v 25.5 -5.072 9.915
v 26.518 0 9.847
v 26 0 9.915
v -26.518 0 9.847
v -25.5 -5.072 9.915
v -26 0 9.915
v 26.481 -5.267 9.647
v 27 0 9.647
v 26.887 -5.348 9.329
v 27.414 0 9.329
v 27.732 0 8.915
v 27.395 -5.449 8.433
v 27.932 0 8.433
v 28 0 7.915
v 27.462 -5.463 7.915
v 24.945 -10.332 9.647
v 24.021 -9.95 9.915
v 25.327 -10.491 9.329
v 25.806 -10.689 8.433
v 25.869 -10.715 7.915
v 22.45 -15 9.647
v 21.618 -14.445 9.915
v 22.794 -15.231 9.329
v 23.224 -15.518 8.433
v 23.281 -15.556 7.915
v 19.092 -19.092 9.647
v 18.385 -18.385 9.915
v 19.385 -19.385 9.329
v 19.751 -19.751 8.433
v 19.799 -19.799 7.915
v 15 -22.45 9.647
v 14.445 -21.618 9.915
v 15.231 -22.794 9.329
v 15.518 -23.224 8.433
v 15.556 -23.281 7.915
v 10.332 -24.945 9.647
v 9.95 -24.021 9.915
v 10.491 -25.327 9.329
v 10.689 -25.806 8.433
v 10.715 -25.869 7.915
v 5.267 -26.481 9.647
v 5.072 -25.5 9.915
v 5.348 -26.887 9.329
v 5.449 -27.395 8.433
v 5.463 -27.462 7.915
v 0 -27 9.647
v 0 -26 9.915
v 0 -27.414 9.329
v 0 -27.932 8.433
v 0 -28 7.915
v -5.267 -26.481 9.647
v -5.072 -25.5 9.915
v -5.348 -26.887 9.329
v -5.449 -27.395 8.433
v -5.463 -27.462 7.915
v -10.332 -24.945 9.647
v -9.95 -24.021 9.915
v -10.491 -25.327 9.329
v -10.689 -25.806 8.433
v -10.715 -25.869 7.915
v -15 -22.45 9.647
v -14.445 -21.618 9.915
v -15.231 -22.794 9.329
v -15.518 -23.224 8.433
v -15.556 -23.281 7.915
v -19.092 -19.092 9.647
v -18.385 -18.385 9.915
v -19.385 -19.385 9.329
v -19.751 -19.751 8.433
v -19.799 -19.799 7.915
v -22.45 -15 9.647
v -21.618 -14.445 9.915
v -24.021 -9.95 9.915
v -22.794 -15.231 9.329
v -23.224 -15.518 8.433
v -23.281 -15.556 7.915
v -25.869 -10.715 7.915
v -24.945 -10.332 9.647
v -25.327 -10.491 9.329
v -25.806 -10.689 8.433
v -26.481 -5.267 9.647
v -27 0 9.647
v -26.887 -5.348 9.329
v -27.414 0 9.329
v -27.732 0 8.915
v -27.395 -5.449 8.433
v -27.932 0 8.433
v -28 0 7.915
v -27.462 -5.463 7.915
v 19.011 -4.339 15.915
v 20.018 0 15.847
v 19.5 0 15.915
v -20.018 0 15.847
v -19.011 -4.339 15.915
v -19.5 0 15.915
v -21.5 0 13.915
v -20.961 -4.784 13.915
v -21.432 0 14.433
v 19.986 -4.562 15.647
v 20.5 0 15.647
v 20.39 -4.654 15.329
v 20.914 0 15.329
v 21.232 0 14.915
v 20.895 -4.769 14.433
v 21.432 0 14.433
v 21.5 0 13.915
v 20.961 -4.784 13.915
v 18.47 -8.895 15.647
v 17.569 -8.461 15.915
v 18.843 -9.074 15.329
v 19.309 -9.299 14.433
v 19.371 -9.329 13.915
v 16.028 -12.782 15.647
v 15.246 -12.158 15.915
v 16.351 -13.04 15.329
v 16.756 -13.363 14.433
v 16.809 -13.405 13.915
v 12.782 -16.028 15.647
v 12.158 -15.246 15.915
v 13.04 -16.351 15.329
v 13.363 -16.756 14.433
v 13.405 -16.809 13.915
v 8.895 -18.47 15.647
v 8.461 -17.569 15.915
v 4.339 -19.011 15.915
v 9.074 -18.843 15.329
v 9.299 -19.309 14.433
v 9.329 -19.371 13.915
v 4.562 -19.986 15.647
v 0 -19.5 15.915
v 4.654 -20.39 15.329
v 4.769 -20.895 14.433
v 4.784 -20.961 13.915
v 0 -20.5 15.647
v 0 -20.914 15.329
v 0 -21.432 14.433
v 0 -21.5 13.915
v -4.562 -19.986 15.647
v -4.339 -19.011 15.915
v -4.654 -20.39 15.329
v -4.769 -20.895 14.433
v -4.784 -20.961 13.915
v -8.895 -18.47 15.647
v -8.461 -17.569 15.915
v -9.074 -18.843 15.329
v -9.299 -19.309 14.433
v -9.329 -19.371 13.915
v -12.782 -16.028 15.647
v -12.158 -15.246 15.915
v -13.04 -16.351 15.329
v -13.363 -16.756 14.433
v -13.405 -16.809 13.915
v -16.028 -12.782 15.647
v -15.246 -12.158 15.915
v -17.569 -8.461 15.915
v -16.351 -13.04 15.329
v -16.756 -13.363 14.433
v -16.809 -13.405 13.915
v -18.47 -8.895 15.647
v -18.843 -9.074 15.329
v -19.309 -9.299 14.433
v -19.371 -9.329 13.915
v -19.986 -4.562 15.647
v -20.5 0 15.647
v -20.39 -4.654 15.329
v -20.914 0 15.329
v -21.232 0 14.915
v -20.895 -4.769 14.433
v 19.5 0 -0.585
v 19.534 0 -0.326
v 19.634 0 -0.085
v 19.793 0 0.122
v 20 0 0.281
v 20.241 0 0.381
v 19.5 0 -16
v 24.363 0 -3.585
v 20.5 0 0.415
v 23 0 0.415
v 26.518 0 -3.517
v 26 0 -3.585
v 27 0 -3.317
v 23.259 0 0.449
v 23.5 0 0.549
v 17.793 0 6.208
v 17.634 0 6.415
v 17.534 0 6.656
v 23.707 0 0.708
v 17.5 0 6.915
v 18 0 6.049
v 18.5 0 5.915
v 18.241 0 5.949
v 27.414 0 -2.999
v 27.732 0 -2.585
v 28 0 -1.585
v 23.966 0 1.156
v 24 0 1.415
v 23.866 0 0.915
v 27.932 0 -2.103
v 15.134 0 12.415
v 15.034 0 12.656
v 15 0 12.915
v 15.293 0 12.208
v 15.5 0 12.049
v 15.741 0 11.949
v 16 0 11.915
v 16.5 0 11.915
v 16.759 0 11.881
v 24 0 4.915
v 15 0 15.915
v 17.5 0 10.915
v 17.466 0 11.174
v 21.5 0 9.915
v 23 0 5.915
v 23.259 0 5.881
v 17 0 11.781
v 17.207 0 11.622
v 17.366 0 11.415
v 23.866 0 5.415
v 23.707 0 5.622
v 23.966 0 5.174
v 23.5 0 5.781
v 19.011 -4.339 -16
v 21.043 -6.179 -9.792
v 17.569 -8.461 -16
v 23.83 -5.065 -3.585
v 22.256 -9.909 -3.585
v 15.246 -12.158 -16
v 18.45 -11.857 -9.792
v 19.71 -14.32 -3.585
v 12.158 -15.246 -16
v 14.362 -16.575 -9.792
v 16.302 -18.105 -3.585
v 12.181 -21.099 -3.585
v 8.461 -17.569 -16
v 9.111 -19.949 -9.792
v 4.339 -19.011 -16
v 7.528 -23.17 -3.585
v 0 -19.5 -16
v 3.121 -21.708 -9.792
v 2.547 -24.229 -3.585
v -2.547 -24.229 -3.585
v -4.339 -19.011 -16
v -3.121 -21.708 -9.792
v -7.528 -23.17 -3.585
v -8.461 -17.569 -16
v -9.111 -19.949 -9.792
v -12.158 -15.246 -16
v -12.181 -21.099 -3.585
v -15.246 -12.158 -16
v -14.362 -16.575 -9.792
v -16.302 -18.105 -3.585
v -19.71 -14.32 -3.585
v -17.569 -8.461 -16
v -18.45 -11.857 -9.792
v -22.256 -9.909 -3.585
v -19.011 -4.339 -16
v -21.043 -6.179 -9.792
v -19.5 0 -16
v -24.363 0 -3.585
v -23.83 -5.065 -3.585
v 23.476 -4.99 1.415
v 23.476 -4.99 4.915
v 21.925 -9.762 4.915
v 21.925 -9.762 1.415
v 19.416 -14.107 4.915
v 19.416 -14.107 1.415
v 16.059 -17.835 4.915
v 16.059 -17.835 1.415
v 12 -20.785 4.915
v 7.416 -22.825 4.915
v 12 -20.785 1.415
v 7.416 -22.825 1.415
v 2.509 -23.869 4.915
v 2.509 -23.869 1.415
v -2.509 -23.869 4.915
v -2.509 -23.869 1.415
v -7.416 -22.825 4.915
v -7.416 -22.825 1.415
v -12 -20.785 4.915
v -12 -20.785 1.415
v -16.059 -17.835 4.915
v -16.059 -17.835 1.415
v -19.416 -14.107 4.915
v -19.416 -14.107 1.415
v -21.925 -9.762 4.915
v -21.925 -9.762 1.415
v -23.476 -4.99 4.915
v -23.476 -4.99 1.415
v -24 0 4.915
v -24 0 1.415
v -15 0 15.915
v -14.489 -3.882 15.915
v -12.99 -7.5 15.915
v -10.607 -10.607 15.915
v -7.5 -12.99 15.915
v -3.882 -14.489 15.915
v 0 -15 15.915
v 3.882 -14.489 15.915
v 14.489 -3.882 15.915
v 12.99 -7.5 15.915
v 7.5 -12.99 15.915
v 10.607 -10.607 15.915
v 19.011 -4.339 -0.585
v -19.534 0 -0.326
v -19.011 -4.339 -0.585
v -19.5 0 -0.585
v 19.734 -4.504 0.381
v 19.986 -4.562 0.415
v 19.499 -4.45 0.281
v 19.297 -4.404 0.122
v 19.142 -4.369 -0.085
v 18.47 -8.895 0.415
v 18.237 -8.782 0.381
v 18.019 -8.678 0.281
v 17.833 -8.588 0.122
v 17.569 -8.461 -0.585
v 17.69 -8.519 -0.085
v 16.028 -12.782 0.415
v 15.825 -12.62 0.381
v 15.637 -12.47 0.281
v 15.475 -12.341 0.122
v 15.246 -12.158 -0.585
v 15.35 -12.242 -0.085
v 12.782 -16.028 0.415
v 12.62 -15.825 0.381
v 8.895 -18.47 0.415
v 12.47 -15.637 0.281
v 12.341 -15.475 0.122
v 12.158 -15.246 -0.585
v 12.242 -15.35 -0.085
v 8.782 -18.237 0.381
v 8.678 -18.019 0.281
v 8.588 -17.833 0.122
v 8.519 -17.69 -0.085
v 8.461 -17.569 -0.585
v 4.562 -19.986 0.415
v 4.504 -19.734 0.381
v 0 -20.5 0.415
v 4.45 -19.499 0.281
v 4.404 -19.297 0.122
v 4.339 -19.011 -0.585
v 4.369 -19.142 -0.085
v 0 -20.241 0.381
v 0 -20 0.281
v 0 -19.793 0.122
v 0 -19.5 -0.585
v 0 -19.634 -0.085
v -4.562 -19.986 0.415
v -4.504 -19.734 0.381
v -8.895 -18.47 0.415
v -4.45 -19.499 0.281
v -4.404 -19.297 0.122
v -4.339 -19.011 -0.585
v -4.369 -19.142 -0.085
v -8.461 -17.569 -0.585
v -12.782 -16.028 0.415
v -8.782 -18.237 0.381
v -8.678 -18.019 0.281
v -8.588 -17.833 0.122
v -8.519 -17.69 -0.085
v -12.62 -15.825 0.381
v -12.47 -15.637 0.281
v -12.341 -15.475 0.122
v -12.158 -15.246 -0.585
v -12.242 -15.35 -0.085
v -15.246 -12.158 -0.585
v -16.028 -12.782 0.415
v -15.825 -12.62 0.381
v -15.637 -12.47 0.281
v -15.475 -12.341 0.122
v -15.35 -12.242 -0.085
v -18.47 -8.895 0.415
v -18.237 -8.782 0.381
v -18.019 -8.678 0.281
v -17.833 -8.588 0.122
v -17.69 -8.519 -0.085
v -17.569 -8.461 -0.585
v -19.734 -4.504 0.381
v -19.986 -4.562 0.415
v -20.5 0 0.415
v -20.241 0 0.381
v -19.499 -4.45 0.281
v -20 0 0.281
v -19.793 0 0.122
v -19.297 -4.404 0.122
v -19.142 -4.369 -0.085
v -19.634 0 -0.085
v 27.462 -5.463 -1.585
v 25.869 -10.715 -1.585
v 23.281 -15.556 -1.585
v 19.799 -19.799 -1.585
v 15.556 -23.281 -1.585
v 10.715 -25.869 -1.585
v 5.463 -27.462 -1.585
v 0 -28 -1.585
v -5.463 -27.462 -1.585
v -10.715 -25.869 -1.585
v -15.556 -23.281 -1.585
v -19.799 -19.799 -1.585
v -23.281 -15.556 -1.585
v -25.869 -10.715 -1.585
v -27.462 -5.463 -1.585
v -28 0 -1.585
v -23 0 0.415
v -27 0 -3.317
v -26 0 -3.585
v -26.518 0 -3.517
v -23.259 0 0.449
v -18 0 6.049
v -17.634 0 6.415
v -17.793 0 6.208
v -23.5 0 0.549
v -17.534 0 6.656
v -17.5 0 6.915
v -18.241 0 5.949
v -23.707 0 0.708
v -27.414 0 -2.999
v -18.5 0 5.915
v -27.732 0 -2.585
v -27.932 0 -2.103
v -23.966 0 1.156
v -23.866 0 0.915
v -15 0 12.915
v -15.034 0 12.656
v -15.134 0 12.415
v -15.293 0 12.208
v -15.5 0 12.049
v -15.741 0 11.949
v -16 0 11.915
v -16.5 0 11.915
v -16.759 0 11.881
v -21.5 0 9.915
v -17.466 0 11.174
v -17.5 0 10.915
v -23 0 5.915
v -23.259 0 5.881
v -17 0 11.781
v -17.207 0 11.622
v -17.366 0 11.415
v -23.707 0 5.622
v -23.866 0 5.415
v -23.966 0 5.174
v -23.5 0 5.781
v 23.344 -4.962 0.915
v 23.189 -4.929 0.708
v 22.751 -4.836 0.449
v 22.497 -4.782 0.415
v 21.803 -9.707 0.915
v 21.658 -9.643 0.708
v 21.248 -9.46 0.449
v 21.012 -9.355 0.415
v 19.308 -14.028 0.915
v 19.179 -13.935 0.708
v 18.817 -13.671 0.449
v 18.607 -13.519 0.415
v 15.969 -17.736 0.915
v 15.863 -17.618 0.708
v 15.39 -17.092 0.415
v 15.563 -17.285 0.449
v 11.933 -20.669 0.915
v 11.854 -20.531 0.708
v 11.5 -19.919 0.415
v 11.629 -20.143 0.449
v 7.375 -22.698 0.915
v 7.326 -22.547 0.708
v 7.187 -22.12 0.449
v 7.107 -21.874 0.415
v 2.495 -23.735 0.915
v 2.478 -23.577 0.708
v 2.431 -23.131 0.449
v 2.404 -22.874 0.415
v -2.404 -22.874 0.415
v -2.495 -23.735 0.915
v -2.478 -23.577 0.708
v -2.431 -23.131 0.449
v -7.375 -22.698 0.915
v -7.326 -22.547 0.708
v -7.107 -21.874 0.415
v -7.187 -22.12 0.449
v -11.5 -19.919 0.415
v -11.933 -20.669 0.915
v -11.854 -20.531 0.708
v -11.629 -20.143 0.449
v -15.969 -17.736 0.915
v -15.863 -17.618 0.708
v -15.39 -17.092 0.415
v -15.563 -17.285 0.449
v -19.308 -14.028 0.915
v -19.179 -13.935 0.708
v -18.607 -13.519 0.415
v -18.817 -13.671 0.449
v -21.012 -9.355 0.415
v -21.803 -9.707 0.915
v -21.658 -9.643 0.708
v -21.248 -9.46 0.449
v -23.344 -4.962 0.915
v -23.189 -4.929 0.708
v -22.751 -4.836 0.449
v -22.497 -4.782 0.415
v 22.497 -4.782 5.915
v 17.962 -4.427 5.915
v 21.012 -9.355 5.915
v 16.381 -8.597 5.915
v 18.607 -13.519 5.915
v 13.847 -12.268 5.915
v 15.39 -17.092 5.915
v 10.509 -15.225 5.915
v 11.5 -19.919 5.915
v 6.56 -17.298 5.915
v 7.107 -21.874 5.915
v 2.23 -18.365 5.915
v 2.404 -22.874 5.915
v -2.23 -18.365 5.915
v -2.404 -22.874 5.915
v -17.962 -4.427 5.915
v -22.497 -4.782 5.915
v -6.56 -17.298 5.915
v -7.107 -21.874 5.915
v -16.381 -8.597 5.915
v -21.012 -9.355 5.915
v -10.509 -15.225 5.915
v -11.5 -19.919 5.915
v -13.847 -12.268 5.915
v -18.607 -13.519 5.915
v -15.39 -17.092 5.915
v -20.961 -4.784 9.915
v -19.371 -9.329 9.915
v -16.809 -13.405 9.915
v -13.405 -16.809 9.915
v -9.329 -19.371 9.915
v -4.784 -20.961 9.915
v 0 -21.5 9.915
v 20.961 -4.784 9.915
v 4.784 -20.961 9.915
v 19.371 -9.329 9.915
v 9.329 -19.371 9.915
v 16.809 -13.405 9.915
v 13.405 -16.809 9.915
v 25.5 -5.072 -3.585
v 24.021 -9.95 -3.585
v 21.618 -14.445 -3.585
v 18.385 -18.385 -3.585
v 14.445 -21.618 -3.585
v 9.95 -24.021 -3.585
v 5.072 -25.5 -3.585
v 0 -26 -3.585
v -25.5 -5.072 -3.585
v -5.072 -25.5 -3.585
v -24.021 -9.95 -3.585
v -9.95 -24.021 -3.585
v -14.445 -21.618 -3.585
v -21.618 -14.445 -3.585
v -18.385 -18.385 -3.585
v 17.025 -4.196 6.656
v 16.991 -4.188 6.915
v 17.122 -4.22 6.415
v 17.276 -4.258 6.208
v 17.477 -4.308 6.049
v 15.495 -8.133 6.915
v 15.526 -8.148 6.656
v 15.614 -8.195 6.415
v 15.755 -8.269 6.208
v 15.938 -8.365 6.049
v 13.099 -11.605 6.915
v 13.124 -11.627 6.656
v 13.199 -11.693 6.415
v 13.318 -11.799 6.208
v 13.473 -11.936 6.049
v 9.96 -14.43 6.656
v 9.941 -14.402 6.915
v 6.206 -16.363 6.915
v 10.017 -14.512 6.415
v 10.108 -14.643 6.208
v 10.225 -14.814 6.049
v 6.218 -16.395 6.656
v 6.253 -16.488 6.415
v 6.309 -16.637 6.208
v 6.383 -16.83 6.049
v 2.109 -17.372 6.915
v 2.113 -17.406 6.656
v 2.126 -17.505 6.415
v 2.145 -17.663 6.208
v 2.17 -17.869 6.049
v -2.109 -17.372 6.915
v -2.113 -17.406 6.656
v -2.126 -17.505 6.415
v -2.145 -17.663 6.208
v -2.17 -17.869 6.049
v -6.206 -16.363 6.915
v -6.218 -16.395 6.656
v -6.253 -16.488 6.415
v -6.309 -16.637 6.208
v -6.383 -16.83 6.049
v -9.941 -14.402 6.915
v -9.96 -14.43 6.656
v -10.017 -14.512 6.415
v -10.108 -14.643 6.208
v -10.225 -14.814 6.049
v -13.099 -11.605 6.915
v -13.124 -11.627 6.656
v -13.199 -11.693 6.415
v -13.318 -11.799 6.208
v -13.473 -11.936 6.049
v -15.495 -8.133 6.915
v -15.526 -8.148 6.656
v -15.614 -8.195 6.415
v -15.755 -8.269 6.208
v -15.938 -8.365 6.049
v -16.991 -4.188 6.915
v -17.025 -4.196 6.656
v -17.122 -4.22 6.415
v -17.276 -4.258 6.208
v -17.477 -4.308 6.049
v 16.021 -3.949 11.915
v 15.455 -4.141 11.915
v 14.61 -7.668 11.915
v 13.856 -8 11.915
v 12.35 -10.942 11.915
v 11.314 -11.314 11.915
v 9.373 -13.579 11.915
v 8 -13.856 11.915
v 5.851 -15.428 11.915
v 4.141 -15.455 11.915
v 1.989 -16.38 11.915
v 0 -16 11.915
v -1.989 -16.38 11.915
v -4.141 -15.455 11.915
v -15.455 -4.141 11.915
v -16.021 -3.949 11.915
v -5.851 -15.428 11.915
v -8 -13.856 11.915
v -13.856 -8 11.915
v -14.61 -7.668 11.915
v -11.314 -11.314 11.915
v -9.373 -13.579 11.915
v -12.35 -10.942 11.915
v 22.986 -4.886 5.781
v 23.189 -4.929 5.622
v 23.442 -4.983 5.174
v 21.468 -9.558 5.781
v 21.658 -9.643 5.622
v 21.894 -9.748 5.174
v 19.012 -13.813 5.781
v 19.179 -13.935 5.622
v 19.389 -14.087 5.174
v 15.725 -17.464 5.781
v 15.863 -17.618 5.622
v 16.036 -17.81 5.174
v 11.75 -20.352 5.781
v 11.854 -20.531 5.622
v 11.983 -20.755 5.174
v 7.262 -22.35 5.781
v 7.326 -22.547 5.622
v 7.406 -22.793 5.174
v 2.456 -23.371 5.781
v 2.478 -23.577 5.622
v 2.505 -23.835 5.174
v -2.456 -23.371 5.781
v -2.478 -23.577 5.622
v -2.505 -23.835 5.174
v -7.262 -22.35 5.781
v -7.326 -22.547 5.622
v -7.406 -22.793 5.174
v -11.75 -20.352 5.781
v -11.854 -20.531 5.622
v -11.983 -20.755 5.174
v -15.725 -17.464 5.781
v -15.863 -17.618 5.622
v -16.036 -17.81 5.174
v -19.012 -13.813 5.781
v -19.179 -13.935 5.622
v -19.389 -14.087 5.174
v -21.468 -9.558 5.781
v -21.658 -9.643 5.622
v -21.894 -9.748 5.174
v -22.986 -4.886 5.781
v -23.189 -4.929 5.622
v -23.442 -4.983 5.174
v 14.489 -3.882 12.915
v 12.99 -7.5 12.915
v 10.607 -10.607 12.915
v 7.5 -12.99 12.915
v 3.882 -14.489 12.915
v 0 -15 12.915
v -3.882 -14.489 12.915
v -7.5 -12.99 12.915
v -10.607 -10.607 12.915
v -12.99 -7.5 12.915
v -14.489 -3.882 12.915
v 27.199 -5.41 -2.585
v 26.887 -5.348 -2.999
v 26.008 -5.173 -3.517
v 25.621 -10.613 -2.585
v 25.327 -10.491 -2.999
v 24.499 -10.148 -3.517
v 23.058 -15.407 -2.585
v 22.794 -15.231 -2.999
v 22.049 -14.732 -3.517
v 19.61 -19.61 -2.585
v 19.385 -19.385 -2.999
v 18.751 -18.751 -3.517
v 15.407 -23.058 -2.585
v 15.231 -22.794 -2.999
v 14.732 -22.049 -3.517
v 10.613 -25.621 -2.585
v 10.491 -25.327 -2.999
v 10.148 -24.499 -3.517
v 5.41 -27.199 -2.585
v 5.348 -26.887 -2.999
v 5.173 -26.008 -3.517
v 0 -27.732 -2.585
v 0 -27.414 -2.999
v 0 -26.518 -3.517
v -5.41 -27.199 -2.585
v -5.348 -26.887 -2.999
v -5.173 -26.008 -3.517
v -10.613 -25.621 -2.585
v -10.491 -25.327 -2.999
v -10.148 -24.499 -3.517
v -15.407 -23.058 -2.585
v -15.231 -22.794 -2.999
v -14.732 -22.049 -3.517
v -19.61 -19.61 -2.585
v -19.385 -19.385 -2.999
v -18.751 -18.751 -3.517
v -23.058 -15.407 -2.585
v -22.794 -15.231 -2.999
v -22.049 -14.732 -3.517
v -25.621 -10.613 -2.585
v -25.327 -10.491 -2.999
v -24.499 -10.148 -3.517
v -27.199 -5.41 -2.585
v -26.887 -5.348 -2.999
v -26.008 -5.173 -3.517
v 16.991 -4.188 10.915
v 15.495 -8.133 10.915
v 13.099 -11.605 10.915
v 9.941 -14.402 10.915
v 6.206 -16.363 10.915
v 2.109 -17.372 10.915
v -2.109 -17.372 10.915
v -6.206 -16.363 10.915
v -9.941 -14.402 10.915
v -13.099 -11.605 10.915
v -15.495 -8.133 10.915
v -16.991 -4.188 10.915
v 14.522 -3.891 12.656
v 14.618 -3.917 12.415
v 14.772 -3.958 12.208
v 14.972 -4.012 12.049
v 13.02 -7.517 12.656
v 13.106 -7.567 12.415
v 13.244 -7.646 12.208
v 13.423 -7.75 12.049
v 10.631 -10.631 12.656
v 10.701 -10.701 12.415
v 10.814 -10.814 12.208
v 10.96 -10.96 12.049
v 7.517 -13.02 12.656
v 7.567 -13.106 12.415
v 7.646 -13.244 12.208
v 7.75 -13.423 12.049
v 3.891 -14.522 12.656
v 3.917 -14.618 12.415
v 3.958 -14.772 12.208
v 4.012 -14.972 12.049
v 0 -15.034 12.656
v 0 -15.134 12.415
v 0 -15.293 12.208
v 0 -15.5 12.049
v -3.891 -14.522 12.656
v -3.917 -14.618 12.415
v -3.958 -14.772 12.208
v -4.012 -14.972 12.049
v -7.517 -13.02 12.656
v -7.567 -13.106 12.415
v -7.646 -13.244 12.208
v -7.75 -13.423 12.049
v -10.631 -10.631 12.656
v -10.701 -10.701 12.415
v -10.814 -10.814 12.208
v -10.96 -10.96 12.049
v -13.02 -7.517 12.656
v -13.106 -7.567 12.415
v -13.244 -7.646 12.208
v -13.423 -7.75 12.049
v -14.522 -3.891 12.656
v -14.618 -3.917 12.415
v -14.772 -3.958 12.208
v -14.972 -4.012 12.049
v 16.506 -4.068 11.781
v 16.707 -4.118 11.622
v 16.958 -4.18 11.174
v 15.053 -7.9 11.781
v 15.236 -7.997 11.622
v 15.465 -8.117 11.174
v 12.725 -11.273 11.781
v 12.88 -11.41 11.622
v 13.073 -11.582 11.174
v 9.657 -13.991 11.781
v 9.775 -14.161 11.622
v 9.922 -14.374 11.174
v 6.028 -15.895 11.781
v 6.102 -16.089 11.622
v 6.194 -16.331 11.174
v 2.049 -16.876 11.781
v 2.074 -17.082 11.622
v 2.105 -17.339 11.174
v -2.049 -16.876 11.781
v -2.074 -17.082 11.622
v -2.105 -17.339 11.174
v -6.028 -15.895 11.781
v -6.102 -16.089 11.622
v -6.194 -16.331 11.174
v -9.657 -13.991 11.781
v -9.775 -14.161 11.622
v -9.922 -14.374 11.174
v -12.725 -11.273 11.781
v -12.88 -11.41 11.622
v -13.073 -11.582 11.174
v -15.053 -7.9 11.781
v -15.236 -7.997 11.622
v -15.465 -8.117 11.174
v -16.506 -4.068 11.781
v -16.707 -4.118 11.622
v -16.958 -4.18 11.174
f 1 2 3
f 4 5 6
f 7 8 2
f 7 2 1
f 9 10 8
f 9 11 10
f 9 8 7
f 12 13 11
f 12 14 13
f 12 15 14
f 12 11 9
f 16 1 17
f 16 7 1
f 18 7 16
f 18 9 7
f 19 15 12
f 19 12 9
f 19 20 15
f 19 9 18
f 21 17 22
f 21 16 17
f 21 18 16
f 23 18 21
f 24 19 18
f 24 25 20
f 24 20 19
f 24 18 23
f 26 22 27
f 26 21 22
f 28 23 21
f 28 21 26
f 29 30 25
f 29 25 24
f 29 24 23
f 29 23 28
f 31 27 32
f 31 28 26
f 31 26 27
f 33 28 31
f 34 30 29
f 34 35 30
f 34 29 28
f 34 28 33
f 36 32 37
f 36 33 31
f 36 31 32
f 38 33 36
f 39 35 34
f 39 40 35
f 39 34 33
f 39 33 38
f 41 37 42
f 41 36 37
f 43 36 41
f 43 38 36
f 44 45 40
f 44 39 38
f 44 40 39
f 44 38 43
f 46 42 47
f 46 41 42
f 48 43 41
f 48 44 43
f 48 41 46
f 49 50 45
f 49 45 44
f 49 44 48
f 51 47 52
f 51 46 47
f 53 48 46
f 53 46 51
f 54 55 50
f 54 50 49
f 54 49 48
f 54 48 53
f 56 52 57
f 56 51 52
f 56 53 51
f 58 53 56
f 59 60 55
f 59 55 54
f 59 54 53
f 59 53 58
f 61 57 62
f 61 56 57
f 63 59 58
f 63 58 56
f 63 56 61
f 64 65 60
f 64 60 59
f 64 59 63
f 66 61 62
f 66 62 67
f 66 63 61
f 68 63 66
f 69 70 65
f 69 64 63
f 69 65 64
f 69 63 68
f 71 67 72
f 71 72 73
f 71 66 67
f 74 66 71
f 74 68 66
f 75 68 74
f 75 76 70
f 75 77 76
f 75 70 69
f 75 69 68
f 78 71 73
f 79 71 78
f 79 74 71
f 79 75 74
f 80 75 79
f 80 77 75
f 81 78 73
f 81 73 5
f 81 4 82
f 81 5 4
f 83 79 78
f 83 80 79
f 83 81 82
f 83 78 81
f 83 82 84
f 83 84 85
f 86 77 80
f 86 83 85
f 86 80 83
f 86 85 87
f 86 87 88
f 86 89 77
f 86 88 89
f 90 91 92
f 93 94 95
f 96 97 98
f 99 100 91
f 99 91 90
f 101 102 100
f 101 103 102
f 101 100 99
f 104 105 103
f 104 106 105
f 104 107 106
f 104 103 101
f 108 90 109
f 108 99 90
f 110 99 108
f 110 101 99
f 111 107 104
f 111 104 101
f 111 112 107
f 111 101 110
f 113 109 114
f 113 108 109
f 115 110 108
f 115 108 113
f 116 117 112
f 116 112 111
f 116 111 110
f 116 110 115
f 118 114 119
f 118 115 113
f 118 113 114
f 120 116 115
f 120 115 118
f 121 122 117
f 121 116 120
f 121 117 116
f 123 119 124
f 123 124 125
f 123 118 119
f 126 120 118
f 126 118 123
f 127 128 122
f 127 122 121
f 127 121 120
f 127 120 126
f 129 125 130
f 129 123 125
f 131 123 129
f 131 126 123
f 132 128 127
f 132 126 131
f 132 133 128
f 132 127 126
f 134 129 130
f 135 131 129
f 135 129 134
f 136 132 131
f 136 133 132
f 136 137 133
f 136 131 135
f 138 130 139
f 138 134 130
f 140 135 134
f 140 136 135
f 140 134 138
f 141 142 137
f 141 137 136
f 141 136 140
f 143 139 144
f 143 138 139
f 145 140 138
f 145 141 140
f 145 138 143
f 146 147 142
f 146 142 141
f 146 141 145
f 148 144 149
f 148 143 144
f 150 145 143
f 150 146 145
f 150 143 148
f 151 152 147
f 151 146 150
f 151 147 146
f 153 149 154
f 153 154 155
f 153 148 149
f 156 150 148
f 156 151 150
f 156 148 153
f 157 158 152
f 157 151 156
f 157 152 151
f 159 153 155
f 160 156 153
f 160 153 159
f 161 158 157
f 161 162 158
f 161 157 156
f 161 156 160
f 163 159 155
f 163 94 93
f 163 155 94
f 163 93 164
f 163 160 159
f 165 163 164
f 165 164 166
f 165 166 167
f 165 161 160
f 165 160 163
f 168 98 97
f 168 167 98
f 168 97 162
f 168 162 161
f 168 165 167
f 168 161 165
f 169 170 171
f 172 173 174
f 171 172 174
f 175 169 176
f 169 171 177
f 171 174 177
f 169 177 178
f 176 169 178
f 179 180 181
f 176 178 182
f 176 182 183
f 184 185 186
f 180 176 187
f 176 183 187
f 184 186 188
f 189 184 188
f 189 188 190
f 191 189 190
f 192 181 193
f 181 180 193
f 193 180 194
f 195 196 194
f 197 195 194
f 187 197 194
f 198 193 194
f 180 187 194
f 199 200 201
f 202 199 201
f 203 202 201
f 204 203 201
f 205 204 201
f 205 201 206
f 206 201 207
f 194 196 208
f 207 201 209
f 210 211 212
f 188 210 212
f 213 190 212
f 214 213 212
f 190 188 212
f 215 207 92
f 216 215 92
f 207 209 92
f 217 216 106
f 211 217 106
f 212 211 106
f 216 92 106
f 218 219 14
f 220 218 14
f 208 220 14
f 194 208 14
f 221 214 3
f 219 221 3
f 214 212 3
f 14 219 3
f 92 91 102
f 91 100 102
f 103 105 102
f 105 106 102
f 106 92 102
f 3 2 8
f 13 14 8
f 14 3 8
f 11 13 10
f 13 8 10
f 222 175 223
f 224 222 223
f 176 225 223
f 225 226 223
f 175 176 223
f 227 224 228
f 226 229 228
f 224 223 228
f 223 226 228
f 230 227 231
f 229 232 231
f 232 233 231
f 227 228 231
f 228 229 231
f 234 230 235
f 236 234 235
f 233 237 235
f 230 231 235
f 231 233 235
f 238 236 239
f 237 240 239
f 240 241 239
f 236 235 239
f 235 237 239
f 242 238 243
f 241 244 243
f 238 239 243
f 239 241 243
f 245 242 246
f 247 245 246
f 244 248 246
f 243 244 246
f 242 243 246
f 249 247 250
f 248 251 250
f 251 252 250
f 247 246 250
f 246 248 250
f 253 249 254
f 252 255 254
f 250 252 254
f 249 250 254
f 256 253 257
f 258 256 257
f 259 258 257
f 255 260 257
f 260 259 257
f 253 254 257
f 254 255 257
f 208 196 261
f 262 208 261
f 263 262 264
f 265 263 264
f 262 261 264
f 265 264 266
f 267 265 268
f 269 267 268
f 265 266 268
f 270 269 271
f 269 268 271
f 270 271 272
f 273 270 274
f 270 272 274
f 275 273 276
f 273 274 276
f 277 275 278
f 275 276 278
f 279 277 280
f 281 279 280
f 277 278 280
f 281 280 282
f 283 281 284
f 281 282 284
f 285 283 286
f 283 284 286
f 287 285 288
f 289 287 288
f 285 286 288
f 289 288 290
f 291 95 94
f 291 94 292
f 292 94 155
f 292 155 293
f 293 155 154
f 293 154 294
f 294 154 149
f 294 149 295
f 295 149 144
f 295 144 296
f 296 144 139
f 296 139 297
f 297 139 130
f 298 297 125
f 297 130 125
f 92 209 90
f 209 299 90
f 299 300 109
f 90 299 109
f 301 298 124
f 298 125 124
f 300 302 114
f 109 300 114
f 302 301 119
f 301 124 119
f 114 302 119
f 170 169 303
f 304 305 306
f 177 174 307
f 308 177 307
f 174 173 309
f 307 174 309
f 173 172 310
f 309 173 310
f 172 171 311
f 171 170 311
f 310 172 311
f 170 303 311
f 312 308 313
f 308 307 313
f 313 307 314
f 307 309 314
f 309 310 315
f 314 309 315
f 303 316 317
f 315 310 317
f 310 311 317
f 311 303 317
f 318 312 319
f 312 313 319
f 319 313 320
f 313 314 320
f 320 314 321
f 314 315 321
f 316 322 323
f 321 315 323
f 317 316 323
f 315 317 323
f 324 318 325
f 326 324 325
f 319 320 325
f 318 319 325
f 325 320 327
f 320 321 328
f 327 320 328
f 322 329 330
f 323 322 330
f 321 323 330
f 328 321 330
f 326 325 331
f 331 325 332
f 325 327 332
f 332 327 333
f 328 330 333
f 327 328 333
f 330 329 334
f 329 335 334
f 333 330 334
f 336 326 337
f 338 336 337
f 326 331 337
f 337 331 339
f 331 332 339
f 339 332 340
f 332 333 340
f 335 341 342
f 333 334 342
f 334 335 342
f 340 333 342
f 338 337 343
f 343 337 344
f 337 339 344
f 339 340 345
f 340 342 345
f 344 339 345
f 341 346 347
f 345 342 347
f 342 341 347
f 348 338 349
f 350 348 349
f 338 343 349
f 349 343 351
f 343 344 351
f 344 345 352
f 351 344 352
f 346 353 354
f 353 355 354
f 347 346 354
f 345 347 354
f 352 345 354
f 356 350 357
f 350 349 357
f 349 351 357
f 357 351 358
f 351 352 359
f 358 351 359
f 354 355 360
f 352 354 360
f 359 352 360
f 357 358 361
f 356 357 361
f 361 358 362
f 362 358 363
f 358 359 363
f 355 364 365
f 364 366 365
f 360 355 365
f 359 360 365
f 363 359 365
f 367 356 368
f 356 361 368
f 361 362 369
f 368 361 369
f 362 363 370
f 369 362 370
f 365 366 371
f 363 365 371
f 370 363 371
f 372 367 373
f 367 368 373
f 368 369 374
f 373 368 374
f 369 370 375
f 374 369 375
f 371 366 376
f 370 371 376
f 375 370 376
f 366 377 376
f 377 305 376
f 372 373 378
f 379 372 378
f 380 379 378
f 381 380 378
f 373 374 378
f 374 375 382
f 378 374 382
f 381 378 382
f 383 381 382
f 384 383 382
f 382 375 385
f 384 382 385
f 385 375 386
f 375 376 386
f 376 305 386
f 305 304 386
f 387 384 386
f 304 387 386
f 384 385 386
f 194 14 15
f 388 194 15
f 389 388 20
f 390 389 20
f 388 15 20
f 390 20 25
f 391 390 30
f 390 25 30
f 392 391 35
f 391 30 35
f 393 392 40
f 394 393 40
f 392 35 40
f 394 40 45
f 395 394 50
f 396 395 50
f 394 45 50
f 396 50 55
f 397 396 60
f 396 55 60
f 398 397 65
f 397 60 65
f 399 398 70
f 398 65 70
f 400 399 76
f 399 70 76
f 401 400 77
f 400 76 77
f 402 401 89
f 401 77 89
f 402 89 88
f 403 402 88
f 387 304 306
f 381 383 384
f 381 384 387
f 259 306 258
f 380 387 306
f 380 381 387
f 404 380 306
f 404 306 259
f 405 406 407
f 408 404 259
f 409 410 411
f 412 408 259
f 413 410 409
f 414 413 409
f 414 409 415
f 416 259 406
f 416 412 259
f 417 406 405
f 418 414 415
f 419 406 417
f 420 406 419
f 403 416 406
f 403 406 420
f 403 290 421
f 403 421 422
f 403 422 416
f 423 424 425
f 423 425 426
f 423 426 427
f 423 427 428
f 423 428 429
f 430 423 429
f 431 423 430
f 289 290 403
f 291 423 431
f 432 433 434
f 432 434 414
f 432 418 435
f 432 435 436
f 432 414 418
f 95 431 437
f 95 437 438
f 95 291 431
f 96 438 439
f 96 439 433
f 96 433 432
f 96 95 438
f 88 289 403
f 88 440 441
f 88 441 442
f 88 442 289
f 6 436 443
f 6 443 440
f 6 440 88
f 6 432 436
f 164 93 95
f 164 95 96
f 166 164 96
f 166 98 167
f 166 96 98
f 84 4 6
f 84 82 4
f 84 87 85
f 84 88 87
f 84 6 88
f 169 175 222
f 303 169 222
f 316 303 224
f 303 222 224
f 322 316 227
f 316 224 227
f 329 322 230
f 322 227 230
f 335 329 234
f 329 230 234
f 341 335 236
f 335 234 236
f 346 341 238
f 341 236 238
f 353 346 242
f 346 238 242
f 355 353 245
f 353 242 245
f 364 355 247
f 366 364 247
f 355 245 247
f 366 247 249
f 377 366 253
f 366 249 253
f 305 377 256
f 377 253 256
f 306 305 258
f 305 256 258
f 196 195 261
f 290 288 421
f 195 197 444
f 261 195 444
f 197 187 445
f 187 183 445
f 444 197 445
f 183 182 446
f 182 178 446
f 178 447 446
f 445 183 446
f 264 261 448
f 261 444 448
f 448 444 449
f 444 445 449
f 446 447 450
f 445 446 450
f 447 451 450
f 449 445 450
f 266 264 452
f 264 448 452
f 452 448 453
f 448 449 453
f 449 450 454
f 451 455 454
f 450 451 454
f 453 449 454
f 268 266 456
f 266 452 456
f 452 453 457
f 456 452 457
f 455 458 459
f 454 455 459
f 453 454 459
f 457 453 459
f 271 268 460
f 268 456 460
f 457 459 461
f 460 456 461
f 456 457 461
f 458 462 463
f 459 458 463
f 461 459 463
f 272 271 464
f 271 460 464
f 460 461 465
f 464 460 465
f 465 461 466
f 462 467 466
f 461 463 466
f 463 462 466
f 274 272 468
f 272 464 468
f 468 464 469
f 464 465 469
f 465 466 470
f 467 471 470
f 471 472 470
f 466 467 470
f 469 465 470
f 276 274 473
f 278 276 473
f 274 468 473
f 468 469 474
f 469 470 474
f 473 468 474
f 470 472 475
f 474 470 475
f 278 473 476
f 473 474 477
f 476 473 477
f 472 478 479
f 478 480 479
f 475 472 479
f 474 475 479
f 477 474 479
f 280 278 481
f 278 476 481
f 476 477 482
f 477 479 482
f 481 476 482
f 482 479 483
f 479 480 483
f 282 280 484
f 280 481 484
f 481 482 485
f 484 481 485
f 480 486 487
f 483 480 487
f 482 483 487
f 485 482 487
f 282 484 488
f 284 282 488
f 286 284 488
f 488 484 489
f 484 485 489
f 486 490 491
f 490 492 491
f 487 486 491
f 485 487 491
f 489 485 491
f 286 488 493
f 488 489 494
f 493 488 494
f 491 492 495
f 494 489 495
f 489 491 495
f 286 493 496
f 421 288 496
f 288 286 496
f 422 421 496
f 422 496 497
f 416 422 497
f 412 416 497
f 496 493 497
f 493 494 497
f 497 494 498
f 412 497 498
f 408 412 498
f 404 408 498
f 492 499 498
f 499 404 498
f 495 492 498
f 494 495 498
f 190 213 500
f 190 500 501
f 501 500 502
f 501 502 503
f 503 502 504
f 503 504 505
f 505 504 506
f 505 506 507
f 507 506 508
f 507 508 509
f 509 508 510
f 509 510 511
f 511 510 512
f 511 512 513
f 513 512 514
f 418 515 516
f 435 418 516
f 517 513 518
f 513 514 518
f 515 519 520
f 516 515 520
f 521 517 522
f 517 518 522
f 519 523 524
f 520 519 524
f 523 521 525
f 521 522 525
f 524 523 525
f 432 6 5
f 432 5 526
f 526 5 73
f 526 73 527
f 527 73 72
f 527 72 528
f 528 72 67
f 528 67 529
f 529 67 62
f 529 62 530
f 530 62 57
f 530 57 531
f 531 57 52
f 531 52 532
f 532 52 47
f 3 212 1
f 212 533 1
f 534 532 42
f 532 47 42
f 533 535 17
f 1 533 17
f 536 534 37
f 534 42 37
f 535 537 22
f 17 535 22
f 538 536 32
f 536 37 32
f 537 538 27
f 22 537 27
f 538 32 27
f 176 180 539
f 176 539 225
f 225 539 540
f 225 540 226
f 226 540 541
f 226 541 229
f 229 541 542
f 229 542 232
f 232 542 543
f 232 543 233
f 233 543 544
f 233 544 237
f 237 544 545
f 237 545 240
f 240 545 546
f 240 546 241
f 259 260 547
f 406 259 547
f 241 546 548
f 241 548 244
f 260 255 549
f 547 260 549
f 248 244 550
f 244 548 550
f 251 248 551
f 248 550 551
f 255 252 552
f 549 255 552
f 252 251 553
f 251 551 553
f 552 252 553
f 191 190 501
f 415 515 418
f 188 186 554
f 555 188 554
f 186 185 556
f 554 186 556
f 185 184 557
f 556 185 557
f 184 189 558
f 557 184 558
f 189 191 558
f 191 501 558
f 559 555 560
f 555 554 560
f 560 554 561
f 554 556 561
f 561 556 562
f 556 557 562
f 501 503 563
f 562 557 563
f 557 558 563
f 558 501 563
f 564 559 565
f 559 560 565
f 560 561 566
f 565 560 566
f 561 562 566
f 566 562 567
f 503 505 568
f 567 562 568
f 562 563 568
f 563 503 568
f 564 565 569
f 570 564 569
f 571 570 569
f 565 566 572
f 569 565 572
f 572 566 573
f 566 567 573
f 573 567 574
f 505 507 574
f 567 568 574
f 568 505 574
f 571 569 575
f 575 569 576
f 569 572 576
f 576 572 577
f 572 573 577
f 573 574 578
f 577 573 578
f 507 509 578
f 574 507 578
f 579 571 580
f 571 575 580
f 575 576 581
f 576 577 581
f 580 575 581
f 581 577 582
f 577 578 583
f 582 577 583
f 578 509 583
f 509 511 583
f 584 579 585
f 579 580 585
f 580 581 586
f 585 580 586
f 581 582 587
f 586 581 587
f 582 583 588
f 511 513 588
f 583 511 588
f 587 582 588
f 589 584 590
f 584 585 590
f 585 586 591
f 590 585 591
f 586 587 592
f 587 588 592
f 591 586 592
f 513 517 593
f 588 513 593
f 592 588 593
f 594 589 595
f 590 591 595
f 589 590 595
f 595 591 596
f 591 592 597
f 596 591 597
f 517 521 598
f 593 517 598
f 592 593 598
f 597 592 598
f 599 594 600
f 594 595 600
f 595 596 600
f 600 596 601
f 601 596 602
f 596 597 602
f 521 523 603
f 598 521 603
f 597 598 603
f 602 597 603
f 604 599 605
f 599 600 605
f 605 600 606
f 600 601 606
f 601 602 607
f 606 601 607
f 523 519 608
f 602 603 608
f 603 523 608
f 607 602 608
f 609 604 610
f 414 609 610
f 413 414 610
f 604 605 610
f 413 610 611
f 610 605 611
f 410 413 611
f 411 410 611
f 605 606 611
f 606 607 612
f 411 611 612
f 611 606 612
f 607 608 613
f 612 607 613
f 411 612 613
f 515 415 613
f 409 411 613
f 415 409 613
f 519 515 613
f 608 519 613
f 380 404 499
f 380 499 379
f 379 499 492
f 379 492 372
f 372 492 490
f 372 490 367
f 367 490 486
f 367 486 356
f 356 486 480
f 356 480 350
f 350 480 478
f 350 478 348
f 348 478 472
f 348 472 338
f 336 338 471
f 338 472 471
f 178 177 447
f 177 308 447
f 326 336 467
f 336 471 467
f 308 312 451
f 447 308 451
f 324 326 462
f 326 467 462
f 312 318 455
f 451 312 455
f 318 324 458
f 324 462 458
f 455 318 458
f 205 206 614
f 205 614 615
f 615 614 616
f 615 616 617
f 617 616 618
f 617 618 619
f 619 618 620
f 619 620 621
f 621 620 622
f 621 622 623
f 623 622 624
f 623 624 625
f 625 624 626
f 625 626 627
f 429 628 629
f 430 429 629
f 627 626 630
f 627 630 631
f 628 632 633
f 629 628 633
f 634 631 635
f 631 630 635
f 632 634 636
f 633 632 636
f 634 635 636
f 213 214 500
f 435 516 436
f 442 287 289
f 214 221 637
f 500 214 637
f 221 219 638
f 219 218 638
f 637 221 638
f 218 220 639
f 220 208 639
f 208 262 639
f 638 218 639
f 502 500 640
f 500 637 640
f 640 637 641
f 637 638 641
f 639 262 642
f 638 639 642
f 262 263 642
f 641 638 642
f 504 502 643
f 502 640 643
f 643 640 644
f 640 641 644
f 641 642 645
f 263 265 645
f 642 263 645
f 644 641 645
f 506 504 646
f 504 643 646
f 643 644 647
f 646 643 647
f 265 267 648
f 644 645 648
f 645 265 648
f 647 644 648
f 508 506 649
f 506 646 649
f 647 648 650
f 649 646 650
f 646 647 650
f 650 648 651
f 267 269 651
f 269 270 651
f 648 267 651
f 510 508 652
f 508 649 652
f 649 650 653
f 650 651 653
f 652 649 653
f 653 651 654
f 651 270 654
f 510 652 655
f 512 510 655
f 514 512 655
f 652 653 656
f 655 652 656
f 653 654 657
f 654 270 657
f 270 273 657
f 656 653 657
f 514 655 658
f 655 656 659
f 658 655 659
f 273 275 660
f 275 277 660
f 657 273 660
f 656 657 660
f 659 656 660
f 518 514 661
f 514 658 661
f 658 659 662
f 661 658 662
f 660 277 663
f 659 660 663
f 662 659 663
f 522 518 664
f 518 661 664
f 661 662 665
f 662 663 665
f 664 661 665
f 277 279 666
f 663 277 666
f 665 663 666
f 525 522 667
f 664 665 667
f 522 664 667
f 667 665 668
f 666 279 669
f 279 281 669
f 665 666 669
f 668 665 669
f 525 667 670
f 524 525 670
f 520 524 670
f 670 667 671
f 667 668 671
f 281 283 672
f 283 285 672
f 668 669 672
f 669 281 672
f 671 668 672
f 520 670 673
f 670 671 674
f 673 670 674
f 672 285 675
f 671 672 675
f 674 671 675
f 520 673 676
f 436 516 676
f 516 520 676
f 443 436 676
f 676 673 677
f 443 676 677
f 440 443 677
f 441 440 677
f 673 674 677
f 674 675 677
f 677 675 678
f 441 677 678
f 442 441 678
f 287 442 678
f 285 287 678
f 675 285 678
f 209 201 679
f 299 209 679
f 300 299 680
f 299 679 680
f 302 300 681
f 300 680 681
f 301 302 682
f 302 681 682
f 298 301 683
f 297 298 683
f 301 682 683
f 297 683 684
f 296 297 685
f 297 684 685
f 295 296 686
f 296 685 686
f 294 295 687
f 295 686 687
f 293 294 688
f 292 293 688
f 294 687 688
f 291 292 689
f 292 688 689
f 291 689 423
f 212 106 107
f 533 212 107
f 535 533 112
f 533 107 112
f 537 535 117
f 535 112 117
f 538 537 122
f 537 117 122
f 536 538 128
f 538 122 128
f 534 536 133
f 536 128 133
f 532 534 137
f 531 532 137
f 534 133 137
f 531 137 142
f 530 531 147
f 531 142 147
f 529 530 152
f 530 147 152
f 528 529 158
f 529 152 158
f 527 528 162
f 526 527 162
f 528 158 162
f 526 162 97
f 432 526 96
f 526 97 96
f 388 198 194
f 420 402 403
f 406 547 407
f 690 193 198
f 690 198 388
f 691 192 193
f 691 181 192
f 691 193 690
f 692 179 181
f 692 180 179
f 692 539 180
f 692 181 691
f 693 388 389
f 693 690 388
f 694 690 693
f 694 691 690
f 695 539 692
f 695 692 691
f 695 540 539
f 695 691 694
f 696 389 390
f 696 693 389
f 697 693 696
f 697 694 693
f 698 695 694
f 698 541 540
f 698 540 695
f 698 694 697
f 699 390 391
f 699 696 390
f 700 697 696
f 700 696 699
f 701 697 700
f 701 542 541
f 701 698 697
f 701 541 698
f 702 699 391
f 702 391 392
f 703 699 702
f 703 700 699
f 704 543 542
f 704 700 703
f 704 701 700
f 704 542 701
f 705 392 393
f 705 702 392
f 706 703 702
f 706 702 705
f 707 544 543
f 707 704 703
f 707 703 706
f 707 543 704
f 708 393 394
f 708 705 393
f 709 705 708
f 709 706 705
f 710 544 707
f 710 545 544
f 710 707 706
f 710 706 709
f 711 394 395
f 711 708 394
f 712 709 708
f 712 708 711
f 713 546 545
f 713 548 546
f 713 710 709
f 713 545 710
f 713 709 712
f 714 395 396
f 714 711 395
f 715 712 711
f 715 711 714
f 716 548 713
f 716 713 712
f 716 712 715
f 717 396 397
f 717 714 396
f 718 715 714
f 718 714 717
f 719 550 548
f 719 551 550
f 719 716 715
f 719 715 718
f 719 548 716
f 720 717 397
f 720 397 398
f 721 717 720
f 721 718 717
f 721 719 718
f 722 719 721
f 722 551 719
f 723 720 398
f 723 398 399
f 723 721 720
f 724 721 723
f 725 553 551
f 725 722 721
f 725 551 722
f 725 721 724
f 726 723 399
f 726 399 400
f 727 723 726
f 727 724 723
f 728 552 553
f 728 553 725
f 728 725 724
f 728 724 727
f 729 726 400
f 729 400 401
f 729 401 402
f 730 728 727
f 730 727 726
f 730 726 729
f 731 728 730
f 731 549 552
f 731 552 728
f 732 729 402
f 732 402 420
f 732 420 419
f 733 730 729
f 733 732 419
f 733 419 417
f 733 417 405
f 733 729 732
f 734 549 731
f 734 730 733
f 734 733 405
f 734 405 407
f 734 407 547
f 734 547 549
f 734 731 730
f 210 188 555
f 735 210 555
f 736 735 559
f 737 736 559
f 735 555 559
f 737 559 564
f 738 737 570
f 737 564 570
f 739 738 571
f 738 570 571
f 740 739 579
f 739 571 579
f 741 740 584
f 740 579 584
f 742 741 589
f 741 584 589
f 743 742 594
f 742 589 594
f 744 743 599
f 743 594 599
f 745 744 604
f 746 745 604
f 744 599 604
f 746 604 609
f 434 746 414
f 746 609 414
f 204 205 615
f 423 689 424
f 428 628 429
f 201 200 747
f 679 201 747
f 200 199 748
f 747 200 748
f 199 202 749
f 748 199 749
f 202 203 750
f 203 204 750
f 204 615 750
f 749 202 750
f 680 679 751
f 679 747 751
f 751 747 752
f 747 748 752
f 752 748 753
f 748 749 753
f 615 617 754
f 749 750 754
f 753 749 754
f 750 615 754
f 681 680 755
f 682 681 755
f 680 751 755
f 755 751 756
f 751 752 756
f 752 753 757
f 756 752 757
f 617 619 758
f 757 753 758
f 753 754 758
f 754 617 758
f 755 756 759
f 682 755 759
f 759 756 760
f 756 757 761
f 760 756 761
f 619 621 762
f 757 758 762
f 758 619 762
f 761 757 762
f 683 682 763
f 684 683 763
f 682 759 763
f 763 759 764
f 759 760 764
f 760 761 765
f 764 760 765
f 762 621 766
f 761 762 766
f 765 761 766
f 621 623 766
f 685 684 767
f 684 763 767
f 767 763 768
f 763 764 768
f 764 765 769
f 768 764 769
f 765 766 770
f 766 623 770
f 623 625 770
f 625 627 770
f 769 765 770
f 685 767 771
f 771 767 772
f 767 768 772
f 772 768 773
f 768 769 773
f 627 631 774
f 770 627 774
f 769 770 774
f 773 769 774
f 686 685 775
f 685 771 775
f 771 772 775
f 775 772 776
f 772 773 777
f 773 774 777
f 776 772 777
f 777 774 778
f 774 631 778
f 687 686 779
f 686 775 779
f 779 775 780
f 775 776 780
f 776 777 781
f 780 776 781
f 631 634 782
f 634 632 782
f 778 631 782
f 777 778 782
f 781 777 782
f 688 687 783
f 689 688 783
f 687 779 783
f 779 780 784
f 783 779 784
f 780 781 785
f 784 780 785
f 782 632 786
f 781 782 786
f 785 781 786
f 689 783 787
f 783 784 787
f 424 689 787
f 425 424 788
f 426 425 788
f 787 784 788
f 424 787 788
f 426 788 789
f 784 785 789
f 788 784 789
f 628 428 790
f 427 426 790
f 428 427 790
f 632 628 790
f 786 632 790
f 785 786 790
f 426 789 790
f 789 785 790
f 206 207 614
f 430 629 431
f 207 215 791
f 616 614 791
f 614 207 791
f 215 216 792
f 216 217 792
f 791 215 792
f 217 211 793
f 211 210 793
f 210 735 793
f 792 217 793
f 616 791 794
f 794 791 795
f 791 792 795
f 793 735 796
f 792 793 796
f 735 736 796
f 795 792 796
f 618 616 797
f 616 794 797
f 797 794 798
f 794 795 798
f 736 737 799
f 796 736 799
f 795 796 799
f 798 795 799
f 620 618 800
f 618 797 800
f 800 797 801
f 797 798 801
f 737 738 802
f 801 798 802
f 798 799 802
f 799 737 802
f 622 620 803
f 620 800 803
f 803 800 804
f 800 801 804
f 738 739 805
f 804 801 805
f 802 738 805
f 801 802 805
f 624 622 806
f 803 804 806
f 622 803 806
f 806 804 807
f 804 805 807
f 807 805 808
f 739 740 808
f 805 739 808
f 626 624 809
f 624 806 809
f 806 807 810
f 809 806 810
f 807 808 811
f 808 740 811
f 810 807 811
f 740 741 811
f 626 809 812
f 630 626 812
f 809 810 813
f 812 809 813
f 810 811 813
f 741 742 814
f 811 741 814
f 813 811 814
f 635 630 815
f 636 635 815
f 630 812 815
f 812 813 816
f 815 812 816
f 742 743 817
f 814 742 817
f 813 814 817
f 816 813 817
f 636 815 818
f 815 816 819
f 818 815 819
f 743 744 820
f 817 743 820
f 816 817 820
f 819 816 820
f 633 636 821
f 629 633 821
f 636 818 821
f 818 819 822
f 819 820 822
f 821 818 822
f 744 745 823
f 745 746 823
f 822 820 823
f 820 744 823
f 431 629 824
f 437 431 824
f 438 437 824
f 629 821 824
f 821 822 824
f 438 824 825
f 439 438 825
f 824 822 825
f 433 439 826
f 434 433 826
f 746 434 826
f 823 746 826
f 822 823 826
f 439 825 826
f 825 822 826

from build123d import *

# Parameters (mm, degrees)
F1_ANGLE = 180
F2_R     = 1
F3_R     = 2


with BuildPart() as f1:
    # F0 (on Front) → F1 (revolve)
    with BuildSketch(Plane.XZ):
        Polygon((21.5, 15.915055), (15, 15.915055), (15, 11.915055), (17.5, 11.915055), (17.5, 5.915055), (24, 5.915055), (24, 0.415055), (19.5, 0.415055), (19.5, -16), (24.362529, -3.584945), (28, -3.584945), (28, 9.915055), (21.5, 9.915055), align=None)
    revolve(axis=Axis((0, 0, -25.149144), (0, 0, -1)), revolution_arc=F1_ANGLE)

    # F2
    f2_edges = [f1.edges().sort_by_distance(p)[0] for p in [
        (0, -17.5, 11.915055),
        (0, -17.5, 5.915055),
        (0, -19.5, 0.415055),
        (0, -24, 5.915055),
        (0, -15, 11.915055),
        (0, -24, 0.415055),
    ]]
    fillet(f2_edges, radius=F2_R)

    # F3
    f3_edges = [f1.edges().sort_by_distance(p)[0] for p in [
        (0, -28, -3.584945),
        (0, -28, 9.915055),
        (0, -21.5, 15.915055),
    ]]
    fillet(f3_edges, radius=F3_R)


solid = f1.part
